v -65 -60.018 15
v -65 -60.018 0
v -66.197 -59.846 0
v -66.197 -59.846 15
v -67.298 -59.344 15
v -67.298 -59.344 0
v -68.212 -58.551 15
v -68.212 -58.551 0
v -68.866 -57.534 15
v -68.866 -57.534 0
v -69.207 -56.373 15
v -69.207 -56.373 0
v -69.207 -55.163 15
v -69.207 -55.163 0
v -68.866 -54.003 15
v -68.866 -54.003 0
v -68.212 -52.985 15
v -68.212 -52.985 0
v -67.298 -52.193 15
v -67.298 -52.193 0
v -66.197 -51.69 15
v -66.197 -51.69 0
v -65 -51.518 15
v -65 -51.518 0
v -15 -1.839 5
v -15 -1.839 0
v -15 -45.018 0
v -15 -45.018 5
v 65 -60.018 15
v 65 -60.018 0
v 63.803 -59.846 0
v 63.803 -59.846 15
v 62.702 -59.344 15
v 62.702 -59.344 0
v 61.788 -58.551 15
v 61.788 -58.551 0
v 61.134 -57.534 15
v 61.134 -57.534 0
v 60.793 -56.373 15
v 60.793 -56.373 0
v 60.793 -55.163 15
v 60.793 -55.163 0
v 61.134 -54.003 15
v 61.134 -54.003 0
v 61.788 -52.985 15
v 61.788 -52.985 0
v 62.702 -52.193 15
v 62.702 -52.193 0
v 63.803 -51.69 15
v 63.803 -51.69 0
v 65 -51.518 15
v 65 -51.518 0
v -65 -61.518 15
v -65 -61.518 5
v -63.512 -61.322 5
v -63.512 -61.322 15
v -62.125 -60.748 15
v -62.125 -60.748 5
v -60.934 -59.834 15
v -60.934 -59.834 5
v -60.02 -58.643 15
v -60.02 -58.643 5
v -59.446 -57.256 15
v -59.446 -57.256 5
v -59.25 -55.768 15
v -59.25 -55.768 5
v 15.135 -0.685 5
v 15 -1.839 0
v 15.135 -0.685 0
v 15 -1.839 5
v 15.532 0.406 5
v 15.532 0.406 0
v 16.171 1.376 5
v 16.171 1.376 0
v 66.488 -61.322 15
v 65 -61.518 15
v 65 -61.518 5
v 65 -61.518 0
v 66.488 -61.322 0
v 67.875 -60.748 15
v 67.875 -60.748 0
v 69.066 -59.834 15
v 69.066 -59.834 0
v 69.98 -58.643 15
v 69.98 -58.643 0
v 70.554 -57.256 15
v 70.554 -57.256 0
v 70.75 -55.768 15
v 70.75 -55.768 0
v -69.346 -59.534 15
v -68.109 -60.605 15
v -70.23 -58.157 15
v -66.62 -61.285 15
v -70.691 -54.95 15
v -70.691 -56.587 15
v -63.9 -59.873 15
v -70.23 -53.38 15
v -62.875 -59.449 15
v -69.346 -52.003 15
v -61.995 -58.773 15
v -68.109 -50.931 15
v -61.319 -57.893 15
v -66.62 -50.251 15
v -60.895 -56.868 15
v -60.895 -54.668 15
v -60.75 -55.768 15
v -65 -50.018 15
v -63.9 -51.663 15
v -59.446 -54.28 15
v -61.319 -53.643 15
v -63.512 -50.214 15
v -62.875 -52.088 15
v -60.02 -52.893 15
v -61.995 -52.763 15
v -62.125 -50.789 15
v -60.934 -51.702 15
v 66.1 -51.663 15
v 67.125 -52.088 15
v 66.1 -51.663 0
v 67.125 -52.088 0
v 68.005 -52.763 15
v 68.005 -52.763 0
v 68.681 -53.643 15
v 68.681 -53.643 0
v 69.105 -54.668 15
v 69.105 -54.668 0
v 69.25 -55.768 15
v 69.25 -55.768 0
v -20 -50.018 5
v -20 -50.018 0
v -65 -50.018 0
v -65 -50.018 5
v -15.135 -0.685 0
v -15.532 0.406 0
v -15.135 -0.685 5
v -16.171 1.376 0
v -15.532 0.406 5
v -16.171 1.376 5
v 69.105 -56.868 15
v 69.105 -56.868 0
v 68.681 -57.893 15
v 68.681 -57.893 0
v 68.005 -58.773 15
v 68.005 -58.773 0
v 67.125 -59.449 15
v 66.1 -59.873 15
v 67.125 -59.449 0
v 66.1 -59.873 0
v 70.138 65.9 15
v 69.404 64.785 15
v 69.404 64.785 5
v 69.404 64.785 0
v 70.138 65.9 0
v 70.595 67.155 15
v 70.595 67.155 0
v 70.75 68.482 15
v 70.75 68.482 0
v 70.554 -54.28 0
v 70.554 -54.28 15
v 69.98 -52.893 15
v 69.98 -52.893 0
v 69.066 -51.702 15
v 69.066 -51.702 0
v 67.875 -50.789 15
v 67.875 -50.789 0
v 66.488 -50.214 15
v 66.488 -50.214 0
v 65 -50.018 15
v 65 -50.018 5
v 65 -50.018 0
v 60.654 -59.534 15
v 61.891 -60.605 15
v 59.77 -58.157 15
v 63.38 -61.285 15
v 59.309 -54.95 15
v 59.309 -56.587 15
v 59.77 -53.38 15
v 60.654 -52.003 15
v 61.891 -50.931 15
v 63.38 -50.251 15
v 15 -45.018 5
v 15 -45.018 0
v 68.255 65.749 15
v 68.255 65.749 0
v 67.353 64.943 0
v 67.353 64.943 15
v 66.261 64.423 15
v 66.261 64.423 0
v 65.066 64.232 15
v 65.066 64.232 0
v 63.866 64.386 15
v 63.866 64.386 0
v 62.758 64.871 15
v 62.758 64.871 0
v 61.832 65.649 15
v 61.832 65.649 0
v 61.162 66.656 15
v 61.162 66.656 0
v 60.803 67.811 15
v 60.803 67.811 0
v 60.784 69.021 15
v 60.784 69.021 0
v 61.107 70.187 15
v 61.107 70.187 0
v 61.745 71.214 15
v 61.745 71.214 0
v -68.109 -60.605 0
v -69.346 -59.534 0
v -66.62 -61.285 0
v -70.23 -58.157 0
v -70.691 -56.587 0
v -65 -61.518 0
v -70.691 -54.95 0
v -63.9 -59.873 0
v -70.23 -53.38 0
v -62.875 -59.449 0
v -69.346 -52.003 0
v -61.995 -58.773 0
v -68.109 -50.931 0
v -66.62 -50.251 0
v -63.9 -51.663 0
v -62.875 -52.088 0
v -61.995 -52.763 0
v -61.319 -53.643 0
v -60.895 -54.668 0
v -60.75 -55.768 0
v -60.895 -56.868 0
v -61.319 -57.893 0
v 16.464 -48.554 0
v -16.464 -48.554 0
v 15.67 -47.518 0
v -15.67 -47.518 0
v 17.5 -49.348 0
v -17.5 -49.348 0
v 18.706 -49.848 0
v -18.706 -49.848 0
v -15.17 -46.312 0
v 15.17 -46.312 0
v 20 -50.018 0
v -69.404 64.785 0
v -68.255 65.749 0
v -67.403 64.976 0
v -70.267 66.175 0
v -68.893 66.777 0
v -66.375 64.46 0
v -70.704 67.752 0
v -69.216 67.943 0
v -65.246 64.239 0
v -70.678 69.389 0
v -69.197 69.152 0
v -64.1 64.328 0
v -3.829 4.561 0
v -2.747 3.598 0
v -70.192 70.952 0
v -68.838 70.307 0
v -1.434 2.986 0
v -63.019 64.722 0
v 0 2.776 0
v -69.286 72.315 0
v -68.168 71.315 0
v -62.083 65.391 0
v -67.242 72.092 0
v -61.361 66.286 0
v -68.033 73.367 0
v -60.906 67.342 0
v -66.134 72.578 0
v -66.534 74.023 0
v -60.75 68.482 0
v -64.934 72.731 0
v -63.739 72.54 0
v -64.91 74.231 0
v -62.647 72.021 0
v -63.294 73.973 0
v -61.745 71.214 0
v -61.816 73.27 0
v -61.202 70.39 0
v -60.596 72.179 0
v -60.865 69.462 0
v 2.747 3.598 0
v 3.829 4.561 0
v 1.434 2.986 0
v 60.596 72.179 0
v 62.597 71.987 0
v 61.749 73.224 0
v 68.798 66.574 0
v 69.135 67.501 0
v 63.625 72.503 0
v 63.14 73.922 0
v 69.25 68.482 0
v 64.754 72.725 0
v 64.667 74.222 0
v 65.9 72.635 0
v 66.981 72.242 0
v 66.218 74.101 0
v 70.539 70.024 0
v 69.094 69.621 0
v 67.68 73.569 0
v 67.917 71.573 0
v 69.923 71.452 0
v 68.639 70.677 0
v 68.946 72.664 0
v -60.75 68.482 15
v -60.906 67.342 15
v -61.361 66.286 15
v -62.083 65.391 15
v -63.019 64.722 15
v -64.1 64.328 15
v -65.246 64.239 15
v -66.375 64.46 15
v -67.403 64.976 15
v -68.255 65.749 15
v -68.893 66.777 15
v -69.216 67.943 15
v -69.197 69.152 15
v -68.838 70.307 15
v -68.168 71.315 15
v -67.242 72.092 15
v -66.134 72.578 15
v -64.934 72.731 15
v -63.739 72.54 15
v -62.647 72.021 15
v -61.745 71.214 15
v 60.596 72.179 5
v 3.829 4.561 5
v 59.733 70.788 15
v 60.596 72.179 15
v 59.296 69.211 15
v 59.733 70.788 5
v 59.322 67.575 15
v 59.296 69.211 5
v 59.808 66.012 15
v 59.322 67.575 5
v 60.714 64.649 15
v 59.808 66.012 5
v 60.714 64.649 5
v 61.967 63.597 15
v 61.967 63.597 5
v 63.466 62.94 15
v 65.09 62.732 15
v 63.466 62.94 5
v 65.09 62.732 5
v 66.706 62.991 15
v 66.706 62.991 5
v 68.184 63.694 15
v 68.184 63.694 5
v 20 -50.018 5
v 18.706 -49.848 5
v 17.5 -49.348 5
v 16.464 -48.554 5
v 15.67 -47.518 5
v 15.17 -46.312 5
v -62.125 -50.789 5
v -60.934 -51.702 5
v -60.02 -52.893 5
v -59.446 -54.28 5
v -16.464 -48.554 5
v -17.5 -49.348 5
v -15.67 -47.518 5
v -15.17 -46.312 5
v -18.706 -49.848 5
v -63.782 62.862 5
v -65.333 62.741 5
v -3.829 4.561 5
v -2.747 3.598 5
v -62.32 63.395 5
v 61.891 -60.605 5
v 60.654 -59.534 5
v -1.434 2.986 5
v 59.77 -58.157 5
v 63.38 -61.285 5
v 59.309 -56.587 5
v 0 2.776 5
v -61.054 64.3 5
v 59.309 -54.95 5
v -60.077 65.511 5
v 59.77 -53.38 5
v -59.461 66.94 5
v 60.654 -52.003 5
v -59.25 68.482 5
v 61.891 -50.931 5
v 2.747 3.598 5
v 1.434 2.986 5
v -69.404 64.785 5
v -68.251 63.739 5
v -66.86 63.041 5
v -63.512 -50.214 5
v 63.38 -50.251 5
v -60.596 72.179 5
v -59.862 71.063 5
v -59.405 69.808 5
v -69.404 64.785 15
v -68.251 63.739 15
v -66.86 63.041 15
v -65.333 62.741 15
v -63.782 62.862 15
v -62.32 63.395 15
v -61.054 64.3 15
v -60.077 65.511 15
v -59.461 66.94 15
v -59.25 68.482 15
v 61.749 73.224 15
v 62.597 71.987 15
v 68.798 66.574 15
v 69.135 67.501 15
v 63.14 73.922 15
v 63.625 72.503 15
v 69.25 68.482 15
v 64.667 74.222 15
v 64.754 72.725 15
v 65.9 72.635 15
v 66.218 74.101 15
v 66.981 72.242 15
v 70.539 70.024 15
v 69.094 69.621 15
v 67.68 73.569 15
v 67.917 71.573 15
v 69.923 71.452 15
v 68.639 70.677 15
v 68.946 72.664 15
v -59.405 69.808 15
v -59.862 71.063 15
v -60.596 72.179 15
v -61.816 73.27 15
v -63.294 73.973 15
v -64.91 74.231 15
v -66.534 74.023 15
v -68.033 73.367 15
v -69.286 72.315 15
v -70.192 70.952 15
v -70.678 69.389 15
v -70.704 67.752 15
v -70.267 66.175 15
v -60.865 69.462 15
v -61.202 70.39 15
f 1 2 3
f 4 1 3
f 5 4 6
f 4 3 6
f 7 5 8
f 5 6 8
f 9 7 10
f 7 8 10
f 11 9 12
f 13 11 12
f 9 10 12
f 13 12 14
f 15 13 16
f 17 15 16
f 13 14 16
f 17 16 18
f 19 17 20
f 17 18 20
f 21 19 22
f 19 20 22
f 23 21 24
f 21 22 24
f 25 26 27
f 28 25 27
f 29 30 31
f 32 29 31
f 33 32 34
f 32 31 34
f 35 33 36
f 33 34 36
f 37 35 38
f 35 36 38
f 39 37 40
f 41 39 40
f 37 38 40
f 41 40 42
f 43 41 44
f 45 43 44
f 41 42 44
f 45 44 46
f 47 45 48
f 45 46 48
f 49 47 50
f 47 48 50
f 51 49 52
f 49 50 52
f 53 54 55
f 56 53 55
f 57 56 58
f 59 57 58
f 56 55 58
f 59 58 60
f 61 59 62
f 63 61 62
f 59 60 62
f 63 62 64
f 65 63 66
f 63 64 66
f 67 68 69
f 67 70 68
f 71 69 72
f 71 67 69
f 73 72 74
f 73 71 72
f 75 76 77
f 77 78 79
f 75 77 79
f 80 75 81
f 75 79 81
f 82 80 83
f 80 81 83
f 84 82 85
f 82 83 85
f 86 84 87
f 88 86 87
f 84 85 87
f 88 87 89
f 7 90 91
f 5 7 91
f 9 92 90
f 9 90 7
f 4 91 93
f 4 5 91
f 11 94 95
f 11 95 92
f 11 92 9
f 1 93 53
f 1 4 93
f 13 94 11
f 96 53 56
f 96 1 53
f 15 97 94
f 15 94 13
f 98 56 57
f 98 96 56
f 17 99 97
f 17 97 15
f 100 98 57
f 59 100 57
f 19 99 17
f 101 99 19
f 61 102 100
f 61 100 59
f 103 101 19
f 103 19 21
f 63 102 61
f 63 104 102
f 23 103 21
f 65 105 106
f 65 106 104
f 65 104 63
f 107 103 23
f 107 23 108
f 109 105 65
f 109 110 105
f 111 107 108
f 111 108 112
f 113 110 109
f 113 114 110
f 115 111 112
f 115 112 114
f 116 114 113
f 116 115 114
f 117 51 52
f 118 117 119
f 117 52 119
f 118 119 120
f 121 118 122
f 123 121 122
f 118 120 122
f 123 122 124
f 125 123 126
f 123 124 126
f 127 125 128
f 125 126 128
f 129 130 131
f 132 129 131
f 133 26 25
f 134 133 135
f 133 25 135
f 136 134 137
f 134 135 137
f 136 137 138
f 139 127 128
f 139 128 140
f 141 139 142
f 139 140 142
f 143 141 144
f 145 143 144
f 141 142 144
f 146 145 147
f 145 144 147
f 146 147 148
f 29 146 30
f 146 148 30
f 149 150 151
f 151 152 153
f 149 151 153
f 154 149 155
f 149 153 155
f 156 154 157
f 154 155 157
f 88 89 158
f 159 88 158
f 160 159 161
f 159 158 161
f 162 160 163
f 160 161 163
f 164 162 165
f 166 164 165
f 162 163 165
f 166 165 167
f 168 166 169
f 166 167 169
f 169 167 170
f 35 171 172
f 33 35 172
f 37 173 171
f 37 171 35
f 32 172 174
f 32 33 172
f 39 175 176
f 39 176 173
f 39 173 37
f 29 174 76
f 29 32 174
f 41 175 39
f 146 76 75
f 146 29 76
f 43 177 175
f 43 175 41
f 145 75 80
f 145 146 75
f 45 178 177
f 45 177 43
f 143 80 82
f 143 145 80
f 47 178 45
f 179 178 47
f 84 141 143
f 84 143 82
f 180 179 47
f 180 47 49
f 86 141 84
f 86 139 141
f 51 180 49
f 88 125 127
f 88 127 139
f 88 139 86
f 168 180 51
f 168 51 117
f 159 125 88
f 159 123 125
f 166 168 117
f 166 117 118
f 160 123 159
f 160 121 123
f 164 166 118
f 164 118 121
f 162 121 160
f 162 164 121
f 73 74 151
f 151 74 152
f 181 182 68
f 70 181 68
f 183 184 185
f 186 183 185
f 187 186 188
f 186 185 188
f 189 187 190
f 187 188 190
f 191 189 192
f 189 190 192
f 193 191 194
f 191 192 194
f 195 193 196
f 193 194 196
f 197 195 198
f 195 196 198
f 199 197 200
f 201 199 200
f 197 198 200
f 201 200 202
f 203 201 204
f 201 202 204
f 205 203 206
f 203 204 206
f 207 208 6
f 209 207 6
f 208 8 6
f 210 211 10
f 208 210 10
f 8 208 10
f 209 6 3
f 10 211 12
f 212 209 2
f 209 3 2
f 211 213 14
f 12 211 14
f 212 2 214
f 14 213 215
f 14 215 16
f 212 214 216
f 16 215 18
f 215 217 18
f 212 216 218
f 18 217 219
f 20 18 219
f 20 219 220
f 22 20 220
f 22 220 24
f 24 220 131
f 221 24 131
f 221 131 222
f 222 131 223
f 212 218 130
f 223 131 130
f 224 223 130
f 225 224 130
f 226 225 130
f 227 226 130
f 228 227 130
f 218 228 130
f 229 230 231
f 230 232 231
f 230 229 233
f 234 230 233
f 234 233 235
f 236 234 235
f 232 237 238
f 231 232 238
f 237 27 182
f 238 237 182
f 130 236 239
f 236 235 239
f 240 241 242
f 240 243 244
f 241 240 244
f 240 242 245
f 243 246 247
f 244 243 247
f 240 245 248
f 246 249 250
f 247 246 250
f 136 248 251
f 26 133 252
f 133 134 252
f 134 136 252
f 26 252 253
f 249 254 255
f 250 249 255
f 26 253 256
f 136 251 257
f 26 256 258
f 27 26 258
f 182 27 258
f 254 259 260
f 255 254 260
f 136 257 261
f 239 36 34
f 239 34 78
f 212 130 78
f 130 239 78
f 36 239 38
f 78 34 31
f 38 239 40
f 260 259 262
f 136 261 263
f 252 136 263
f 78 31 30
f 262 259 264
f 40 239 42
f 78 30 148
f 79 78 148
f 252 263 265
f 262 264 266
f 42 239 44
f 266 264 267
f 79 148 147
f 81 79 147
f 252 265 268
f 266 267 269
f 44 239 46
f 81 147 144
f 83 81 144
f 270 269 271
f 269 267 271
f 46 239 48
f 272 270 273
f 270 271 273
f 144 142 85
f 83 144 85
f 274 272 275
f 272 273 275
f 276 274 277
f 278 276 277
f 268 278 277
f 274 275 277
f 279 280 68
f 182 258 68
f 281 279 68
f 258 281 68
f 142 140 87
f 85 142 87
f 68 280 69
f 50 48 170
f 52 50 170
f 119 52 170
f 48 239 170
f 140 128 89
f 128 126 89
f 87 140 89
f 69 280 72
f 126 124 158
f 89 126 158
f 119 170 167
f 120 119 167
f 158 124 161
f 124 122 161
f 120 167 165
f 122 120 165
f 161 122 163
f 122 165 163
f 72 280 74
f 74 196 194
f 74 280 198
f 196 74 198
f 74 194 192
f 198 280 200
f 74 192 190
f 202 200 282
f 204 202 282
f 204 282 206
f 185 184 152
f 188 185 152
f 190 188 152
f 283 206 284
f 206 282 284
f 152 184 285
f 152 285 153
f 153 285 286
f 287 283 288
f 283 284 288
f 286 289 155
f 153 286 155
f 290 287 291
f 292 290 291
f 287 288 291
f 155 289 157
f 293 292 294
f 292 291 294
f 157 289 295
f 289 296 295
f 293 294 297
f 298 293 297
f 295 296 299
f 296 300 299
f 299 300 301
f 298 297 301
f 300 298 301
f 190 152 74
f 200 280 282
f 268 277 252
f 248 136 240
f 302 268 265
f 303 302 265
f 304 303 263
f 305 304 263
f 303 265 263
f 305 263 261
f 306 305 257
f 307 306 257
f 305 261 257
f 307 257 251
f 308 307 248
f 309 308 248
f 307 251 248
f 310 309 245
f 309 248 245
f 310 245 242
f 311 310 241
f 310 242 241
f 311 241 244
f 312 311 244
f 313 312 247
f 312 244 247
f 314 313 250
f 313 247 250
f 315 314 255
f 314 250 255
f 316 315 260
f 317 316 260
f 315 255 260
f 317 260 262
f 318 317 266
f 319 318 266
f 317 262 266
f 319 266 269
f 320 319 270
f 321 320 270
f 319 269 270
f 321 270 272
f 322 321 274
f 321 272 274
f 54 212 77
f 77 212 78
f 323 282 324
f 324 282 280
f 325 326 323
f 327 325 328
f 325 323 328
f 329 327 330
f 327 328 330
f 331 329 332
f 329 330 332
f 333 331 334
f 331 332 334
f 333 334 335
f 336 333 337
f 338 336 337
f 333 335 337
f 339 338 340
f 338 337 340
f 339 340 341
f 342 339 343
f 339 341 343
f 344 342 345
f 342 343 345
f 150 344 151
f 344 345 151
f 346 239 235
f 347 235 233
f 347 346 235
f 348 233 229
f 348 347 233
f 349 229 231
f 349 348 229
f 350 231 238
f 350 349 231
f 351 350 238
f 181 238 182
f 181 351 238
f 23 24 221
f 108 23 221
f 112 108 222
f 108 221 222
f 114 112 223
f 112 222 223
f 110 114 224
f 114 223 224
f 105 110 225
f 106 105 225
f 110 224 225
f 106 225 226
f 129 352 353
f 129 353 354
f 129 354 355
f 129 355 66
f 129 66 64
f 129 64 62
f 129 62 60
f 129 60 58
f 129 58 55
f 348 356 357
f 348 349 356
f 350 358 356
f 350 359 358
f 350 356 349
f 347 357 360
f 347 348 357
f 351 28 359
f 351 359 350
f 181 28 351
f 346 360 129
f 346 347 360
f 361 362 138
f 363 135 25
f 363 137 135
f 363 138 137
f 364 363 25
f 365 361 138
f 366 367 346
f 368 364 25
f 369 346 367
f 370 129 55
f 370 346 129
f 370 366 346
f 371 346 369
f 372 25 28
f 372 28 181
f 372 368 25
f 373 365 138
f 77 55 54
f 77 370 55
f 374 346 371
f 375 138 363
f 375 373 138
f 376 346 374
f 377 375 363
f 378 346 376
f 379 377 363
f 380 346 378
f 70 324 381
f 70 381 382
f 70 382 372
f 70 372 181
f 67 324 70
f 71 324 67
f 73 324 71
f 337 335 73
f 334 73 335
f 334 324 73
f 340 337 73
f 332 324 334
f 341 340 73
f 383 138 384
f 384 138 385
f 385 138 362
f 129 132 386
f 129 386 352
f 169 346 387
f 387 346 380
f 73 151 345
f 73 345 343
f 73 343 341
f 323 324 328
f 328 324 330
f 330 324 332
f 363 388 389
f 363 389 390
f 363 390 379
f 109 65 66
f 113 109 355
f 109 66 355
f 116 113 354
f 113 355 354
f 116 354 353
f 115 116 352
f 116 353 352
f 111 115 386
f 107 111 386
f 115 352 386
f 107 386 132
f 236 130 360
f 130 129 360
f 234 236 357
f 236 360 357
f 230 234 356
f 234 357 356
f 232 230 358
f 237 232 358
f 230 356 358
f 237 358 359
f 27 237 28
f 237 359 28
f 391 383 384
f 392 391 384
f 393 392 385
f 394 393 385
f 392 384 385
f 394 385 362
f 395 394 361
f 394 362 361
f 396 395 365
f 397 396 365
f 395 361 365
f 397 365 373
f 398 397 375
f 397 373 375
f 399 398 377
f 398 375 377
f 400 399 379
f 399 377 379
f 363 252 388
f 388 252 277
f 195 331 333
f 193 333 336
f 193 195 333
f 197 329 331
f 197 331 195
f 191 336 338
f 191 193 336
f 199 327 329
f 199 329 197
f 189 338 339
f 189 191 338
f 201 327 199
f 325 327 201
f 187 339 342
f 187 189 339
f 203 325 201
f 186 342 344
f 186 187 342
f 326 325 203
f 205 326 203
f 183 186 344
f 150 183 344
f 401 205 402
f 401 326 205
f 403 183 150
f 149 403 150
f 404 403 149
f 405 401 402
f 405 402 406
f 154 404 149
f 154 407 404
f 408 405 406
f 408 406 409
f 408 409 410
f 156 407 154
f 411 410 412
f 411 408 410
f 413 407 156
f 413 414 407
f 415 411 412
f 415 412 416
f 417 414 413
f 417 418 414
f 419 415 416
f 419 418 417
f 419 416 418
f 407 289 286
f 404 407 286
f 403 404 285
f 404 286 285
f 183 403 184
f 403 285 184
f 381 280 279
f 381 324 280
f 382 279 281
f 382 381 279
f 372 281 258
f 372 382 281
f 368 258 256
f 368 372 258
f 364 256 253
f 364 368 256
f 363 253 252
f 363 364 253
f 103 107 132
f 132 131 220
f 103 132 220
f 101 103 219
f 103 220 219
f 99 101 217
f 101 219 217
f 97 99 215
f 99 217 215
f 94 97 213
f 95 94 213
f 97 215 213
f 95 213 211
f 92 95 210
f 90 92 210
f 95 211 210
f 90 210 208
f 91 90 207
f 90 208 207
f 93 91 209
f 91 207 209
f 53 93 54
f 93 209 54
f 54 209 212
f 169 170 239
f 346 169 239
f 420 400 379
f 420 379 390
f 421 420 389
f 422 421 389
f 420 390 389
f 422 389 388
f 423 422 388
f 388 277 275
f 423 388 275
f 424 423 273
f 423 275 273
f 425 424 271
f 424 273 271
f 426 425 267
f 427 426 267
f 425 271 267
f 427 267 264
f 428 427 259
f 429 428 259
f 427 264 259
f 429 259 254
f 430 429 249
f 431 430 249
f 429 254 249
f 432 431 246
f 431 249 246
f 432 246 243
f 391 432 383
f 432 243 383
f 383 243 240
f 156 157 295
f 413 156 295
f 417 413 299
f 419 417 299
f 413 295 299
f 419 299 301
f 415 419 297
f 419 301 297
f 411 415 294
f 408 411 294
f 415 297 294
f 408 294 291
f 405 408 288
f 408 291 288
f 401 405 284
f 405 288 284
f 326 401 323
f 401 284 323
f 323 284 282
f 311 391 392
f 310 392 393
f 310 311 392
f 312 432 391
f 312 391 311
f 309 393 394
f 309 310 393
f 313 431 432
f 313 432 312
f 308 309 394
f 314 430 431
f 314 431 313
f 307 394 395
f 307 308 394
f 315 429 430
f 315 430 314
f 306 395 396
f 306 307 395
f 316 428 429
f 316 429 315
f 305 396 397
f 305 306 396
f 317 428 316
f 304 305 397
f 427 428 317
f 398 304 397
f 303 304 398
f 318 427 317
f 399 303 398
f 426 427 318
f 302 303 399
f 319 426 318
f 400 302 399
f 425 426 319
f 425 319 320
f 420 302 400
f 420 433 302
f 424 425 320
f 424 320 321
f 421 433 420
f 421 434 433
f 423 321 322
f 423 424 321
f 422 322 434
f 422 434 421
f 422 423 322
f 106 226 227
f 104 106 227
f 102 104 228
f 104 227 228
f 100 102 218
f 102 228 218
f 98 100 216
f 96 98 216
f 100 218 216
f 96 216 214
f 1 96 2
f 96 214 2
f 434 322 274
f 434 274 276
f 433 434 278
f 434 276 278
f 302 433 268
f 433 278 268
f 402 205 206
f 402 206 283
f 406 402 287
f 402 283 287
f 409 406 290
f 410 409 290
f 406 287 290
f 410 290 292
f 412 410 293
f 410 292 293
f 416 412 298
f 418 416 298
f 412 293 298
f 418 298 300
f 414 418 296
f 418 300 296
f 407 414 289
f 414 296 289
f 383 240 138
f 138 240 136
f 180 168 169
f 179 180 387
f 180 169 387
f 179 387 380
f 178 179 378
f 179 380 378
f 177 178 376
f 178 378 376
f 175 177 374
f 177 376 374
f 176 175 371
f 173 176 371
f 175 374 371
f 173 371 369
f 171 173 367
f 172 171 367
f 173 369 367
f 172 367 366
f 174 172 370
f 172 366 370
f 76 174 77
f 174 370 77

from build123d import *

# Parameters (mm, degrees)
F1_DEPTH = 5
F2_DEPTH = 15
F3_R     = 5


with BuildPart() as f1:
    # F0 (on Top) → F1 (new body)
    with BuildSketch(Plane.XY):
        with BuildLine():
            Line((-69.403826, 64.784578), (-15, -0.018286))
            Line((-15, -0.018286), (-15, -50.018286))
            Line((-15, -50.018286), (-65, -50.018286))
            ThreePointArc((-65, -50.018286), (-60.934136, -51.702422), (-59.25, -55.768286))
            ThreePointArc((-59.25, -55.768286), (-60.934136, -59.83415), (-65, -61.518286))
            Line((-65, -61.518286), (-15, -61.518286))
            Line((-15, -61.518286), (15, -61.518286))
            Line((15, -61.518286), (65, -61.518286))
            ThreePointArc((65, -61.518286), (59.25, -55.768286), (65, -50.018286))
            Line((65, -50.018286), (15, -50.018286))
            Line((15, -50.018286), (15, -0.018286))
            Line((15, -0.018286), (69.403826, 64.784578))
            ThreePointArc((69.403826, 64.784578), (61.302864, 64.077888), (60.596174, 72.17885))
            Line((60.596174, 72.17885), (0, 0))
            Line((0, 0), (-60.596174, 72.17885))
            ThreePointArc((-60.596174, 72.17885), (-59.597015, 70.449009), (-59.25, 68.481714))
            ThreePointArc((-59.25, 68.481714), (-63.032705, 63.078729), (-69.403826, 64.784578))
        make_face()
    extrude(amount=F1_DEPTH)

    # F0 (on Top) → F2 (join)
    with BuildSketch(Plane.XY):
        with BuildLine():
            Line((-65, -51.518286), (-65, -50.018286))
            ThreePointArc((-65, -50.018286), (-70.75, -55.768286), (-65, -61.518286))
            Line((-65, -61.518286), (-65, -60.018286))
            ThreePointArc((-65, -60.018286), (-69.25, -55.768286), (-65, -51.518286))
        make_face()
        with BuildLine():
            ThreePointArc((-59.25, -55.768286), (-60.934136, -51.702422), (-65, -50.018286))
            Line((-65, -50.018286), (-65, -51.518286))
            ThreePointArc((-65, -51.518286), (-61.994796, -52.763082), (-60.75, -55.768286))
            ThreePointArc((-60.75, -55.768286), (-61.994796, -58.77349), (-65, -60.018286))
            Line((-65, -60.018286), (-65, -61.518286))
            ThreePointArc((-65, -61.518286), (-60.934136, -59.83415), (-59.25, -55.768286))
        make_face()
        with BuildLine():
            ThreePointArc((65, -50.018286), (59.25, -55.768286), (65, -61.518286))
            Line((65, -61.518286), (65, -60.018286))
            ThreePointArc((65, -60.018286), (60.75, -55.768286), (65, -51.518286))
            Line((65, -51.518286), (65, -50.018286))
        make_face()
        with BuildLine():
            Line((65, -60.018286), (65, -61.518286))
            ThreePointArc((65, -61.518286), (69.065864, -59.83415), (70.75, -55.768286))
            ThreePointArc((70.75, -55.768286), (69.065864, -51.702422), (65, -50.018286))
            Line((65, -50.018286), (65, -51.518286))
            ThreePointArc((65, -51.518286), (68.005204, -52.763082), (69.25, -55.768286))
            ThreePointArc((69.25, -55.768286), (68.005204, -58.77349), (65, -60.018286))
        make_face()
        with BuildLine():
            Line((61.744998, 71.21438), (60.596174, 72.17885))
            ThreePointArc((60.596174, 72.17885), (61.302864, 64.077888), (69.403826, 64.784578))
            Line((69.403826, 64.784578), (68.255002, 65.749048))
            ThreePointArc((68.255002, 65.749048), (62.267334, 65.226712), (61.744998, 71.21438))
        make_face()
        with BuildLine():
            ThreePointArc((70.75, 68.481714), (66.967295, 73.884699), (60.596174, 72.17885))
            Line((60.596174, 72.17885), (61.744998, 71.21438))
            ThreePointArc((61.744998, 71.21438), (66.454088, 72.475225), (69.25, 68.481714))
            ThreePointArc((69.25, 68.481714), (68.993511, 67.027626), (68.255002, 65.749048))
            Line((68.255002, 65.749048), (69.403826, 64.784578))
            ThreePointArc((69.403826, 64.784578), (70.402985, 66.514419), (70.75, 68.481714))
        make_face()
        with BuildLine():
            ThreePointArc((-60.596174, 72.17885), (-68.697136, 72.88554), (-69.403826, 64.784578))
            Line((-69.403826, 64.784578), (-68.255002, 65.749048))
            ThreePointArc((-68.255002, 65.749048), (-67.732666, 71.736716), (-61.744998, 71.21438))
            Line((-61.744998, 71.21438), (-60.596174, 72.17885))
        make_face()
        with BuildLine():
            Line((-68.255002, 65.749048), (-69.403826, 64.784578))
            ThreePointArc((-69.403826, 64.784578), (-63.032705, 63.078729), (-59.25, 68.481714))
            ThreePointArc((-59.25, 68.481714), (-59.597015, 70.449009), (-60.596174, 72.17885))
            Line((-60.596174, 72.17885), (-61.744998, 71.21438))
            ThreePointArc((-61.744998, 71.21438), (-61.006489, 69.935802), (-60.75, 68.481714))
            ThreePointArc((-60.75, 68.481714), (-63.545912, 64.488203), (-68.255002, 65.749048))
        make_face()
    extrude(amount=F2_DEPTH)

    # F3
    f3_edges = [f1.edges().sort_by_distance(p)[0] for p in [
        (0, 0, 2.5),
        (-15, -0.018286, 2.5),
        (15, -0.018286, 2.5),
        (15, -50.018286, 2.5),
        (-15, -50.018286, 2.5),
    ]]
    fillet(f3_edges, radius=F3_R)


solid = f1.part
